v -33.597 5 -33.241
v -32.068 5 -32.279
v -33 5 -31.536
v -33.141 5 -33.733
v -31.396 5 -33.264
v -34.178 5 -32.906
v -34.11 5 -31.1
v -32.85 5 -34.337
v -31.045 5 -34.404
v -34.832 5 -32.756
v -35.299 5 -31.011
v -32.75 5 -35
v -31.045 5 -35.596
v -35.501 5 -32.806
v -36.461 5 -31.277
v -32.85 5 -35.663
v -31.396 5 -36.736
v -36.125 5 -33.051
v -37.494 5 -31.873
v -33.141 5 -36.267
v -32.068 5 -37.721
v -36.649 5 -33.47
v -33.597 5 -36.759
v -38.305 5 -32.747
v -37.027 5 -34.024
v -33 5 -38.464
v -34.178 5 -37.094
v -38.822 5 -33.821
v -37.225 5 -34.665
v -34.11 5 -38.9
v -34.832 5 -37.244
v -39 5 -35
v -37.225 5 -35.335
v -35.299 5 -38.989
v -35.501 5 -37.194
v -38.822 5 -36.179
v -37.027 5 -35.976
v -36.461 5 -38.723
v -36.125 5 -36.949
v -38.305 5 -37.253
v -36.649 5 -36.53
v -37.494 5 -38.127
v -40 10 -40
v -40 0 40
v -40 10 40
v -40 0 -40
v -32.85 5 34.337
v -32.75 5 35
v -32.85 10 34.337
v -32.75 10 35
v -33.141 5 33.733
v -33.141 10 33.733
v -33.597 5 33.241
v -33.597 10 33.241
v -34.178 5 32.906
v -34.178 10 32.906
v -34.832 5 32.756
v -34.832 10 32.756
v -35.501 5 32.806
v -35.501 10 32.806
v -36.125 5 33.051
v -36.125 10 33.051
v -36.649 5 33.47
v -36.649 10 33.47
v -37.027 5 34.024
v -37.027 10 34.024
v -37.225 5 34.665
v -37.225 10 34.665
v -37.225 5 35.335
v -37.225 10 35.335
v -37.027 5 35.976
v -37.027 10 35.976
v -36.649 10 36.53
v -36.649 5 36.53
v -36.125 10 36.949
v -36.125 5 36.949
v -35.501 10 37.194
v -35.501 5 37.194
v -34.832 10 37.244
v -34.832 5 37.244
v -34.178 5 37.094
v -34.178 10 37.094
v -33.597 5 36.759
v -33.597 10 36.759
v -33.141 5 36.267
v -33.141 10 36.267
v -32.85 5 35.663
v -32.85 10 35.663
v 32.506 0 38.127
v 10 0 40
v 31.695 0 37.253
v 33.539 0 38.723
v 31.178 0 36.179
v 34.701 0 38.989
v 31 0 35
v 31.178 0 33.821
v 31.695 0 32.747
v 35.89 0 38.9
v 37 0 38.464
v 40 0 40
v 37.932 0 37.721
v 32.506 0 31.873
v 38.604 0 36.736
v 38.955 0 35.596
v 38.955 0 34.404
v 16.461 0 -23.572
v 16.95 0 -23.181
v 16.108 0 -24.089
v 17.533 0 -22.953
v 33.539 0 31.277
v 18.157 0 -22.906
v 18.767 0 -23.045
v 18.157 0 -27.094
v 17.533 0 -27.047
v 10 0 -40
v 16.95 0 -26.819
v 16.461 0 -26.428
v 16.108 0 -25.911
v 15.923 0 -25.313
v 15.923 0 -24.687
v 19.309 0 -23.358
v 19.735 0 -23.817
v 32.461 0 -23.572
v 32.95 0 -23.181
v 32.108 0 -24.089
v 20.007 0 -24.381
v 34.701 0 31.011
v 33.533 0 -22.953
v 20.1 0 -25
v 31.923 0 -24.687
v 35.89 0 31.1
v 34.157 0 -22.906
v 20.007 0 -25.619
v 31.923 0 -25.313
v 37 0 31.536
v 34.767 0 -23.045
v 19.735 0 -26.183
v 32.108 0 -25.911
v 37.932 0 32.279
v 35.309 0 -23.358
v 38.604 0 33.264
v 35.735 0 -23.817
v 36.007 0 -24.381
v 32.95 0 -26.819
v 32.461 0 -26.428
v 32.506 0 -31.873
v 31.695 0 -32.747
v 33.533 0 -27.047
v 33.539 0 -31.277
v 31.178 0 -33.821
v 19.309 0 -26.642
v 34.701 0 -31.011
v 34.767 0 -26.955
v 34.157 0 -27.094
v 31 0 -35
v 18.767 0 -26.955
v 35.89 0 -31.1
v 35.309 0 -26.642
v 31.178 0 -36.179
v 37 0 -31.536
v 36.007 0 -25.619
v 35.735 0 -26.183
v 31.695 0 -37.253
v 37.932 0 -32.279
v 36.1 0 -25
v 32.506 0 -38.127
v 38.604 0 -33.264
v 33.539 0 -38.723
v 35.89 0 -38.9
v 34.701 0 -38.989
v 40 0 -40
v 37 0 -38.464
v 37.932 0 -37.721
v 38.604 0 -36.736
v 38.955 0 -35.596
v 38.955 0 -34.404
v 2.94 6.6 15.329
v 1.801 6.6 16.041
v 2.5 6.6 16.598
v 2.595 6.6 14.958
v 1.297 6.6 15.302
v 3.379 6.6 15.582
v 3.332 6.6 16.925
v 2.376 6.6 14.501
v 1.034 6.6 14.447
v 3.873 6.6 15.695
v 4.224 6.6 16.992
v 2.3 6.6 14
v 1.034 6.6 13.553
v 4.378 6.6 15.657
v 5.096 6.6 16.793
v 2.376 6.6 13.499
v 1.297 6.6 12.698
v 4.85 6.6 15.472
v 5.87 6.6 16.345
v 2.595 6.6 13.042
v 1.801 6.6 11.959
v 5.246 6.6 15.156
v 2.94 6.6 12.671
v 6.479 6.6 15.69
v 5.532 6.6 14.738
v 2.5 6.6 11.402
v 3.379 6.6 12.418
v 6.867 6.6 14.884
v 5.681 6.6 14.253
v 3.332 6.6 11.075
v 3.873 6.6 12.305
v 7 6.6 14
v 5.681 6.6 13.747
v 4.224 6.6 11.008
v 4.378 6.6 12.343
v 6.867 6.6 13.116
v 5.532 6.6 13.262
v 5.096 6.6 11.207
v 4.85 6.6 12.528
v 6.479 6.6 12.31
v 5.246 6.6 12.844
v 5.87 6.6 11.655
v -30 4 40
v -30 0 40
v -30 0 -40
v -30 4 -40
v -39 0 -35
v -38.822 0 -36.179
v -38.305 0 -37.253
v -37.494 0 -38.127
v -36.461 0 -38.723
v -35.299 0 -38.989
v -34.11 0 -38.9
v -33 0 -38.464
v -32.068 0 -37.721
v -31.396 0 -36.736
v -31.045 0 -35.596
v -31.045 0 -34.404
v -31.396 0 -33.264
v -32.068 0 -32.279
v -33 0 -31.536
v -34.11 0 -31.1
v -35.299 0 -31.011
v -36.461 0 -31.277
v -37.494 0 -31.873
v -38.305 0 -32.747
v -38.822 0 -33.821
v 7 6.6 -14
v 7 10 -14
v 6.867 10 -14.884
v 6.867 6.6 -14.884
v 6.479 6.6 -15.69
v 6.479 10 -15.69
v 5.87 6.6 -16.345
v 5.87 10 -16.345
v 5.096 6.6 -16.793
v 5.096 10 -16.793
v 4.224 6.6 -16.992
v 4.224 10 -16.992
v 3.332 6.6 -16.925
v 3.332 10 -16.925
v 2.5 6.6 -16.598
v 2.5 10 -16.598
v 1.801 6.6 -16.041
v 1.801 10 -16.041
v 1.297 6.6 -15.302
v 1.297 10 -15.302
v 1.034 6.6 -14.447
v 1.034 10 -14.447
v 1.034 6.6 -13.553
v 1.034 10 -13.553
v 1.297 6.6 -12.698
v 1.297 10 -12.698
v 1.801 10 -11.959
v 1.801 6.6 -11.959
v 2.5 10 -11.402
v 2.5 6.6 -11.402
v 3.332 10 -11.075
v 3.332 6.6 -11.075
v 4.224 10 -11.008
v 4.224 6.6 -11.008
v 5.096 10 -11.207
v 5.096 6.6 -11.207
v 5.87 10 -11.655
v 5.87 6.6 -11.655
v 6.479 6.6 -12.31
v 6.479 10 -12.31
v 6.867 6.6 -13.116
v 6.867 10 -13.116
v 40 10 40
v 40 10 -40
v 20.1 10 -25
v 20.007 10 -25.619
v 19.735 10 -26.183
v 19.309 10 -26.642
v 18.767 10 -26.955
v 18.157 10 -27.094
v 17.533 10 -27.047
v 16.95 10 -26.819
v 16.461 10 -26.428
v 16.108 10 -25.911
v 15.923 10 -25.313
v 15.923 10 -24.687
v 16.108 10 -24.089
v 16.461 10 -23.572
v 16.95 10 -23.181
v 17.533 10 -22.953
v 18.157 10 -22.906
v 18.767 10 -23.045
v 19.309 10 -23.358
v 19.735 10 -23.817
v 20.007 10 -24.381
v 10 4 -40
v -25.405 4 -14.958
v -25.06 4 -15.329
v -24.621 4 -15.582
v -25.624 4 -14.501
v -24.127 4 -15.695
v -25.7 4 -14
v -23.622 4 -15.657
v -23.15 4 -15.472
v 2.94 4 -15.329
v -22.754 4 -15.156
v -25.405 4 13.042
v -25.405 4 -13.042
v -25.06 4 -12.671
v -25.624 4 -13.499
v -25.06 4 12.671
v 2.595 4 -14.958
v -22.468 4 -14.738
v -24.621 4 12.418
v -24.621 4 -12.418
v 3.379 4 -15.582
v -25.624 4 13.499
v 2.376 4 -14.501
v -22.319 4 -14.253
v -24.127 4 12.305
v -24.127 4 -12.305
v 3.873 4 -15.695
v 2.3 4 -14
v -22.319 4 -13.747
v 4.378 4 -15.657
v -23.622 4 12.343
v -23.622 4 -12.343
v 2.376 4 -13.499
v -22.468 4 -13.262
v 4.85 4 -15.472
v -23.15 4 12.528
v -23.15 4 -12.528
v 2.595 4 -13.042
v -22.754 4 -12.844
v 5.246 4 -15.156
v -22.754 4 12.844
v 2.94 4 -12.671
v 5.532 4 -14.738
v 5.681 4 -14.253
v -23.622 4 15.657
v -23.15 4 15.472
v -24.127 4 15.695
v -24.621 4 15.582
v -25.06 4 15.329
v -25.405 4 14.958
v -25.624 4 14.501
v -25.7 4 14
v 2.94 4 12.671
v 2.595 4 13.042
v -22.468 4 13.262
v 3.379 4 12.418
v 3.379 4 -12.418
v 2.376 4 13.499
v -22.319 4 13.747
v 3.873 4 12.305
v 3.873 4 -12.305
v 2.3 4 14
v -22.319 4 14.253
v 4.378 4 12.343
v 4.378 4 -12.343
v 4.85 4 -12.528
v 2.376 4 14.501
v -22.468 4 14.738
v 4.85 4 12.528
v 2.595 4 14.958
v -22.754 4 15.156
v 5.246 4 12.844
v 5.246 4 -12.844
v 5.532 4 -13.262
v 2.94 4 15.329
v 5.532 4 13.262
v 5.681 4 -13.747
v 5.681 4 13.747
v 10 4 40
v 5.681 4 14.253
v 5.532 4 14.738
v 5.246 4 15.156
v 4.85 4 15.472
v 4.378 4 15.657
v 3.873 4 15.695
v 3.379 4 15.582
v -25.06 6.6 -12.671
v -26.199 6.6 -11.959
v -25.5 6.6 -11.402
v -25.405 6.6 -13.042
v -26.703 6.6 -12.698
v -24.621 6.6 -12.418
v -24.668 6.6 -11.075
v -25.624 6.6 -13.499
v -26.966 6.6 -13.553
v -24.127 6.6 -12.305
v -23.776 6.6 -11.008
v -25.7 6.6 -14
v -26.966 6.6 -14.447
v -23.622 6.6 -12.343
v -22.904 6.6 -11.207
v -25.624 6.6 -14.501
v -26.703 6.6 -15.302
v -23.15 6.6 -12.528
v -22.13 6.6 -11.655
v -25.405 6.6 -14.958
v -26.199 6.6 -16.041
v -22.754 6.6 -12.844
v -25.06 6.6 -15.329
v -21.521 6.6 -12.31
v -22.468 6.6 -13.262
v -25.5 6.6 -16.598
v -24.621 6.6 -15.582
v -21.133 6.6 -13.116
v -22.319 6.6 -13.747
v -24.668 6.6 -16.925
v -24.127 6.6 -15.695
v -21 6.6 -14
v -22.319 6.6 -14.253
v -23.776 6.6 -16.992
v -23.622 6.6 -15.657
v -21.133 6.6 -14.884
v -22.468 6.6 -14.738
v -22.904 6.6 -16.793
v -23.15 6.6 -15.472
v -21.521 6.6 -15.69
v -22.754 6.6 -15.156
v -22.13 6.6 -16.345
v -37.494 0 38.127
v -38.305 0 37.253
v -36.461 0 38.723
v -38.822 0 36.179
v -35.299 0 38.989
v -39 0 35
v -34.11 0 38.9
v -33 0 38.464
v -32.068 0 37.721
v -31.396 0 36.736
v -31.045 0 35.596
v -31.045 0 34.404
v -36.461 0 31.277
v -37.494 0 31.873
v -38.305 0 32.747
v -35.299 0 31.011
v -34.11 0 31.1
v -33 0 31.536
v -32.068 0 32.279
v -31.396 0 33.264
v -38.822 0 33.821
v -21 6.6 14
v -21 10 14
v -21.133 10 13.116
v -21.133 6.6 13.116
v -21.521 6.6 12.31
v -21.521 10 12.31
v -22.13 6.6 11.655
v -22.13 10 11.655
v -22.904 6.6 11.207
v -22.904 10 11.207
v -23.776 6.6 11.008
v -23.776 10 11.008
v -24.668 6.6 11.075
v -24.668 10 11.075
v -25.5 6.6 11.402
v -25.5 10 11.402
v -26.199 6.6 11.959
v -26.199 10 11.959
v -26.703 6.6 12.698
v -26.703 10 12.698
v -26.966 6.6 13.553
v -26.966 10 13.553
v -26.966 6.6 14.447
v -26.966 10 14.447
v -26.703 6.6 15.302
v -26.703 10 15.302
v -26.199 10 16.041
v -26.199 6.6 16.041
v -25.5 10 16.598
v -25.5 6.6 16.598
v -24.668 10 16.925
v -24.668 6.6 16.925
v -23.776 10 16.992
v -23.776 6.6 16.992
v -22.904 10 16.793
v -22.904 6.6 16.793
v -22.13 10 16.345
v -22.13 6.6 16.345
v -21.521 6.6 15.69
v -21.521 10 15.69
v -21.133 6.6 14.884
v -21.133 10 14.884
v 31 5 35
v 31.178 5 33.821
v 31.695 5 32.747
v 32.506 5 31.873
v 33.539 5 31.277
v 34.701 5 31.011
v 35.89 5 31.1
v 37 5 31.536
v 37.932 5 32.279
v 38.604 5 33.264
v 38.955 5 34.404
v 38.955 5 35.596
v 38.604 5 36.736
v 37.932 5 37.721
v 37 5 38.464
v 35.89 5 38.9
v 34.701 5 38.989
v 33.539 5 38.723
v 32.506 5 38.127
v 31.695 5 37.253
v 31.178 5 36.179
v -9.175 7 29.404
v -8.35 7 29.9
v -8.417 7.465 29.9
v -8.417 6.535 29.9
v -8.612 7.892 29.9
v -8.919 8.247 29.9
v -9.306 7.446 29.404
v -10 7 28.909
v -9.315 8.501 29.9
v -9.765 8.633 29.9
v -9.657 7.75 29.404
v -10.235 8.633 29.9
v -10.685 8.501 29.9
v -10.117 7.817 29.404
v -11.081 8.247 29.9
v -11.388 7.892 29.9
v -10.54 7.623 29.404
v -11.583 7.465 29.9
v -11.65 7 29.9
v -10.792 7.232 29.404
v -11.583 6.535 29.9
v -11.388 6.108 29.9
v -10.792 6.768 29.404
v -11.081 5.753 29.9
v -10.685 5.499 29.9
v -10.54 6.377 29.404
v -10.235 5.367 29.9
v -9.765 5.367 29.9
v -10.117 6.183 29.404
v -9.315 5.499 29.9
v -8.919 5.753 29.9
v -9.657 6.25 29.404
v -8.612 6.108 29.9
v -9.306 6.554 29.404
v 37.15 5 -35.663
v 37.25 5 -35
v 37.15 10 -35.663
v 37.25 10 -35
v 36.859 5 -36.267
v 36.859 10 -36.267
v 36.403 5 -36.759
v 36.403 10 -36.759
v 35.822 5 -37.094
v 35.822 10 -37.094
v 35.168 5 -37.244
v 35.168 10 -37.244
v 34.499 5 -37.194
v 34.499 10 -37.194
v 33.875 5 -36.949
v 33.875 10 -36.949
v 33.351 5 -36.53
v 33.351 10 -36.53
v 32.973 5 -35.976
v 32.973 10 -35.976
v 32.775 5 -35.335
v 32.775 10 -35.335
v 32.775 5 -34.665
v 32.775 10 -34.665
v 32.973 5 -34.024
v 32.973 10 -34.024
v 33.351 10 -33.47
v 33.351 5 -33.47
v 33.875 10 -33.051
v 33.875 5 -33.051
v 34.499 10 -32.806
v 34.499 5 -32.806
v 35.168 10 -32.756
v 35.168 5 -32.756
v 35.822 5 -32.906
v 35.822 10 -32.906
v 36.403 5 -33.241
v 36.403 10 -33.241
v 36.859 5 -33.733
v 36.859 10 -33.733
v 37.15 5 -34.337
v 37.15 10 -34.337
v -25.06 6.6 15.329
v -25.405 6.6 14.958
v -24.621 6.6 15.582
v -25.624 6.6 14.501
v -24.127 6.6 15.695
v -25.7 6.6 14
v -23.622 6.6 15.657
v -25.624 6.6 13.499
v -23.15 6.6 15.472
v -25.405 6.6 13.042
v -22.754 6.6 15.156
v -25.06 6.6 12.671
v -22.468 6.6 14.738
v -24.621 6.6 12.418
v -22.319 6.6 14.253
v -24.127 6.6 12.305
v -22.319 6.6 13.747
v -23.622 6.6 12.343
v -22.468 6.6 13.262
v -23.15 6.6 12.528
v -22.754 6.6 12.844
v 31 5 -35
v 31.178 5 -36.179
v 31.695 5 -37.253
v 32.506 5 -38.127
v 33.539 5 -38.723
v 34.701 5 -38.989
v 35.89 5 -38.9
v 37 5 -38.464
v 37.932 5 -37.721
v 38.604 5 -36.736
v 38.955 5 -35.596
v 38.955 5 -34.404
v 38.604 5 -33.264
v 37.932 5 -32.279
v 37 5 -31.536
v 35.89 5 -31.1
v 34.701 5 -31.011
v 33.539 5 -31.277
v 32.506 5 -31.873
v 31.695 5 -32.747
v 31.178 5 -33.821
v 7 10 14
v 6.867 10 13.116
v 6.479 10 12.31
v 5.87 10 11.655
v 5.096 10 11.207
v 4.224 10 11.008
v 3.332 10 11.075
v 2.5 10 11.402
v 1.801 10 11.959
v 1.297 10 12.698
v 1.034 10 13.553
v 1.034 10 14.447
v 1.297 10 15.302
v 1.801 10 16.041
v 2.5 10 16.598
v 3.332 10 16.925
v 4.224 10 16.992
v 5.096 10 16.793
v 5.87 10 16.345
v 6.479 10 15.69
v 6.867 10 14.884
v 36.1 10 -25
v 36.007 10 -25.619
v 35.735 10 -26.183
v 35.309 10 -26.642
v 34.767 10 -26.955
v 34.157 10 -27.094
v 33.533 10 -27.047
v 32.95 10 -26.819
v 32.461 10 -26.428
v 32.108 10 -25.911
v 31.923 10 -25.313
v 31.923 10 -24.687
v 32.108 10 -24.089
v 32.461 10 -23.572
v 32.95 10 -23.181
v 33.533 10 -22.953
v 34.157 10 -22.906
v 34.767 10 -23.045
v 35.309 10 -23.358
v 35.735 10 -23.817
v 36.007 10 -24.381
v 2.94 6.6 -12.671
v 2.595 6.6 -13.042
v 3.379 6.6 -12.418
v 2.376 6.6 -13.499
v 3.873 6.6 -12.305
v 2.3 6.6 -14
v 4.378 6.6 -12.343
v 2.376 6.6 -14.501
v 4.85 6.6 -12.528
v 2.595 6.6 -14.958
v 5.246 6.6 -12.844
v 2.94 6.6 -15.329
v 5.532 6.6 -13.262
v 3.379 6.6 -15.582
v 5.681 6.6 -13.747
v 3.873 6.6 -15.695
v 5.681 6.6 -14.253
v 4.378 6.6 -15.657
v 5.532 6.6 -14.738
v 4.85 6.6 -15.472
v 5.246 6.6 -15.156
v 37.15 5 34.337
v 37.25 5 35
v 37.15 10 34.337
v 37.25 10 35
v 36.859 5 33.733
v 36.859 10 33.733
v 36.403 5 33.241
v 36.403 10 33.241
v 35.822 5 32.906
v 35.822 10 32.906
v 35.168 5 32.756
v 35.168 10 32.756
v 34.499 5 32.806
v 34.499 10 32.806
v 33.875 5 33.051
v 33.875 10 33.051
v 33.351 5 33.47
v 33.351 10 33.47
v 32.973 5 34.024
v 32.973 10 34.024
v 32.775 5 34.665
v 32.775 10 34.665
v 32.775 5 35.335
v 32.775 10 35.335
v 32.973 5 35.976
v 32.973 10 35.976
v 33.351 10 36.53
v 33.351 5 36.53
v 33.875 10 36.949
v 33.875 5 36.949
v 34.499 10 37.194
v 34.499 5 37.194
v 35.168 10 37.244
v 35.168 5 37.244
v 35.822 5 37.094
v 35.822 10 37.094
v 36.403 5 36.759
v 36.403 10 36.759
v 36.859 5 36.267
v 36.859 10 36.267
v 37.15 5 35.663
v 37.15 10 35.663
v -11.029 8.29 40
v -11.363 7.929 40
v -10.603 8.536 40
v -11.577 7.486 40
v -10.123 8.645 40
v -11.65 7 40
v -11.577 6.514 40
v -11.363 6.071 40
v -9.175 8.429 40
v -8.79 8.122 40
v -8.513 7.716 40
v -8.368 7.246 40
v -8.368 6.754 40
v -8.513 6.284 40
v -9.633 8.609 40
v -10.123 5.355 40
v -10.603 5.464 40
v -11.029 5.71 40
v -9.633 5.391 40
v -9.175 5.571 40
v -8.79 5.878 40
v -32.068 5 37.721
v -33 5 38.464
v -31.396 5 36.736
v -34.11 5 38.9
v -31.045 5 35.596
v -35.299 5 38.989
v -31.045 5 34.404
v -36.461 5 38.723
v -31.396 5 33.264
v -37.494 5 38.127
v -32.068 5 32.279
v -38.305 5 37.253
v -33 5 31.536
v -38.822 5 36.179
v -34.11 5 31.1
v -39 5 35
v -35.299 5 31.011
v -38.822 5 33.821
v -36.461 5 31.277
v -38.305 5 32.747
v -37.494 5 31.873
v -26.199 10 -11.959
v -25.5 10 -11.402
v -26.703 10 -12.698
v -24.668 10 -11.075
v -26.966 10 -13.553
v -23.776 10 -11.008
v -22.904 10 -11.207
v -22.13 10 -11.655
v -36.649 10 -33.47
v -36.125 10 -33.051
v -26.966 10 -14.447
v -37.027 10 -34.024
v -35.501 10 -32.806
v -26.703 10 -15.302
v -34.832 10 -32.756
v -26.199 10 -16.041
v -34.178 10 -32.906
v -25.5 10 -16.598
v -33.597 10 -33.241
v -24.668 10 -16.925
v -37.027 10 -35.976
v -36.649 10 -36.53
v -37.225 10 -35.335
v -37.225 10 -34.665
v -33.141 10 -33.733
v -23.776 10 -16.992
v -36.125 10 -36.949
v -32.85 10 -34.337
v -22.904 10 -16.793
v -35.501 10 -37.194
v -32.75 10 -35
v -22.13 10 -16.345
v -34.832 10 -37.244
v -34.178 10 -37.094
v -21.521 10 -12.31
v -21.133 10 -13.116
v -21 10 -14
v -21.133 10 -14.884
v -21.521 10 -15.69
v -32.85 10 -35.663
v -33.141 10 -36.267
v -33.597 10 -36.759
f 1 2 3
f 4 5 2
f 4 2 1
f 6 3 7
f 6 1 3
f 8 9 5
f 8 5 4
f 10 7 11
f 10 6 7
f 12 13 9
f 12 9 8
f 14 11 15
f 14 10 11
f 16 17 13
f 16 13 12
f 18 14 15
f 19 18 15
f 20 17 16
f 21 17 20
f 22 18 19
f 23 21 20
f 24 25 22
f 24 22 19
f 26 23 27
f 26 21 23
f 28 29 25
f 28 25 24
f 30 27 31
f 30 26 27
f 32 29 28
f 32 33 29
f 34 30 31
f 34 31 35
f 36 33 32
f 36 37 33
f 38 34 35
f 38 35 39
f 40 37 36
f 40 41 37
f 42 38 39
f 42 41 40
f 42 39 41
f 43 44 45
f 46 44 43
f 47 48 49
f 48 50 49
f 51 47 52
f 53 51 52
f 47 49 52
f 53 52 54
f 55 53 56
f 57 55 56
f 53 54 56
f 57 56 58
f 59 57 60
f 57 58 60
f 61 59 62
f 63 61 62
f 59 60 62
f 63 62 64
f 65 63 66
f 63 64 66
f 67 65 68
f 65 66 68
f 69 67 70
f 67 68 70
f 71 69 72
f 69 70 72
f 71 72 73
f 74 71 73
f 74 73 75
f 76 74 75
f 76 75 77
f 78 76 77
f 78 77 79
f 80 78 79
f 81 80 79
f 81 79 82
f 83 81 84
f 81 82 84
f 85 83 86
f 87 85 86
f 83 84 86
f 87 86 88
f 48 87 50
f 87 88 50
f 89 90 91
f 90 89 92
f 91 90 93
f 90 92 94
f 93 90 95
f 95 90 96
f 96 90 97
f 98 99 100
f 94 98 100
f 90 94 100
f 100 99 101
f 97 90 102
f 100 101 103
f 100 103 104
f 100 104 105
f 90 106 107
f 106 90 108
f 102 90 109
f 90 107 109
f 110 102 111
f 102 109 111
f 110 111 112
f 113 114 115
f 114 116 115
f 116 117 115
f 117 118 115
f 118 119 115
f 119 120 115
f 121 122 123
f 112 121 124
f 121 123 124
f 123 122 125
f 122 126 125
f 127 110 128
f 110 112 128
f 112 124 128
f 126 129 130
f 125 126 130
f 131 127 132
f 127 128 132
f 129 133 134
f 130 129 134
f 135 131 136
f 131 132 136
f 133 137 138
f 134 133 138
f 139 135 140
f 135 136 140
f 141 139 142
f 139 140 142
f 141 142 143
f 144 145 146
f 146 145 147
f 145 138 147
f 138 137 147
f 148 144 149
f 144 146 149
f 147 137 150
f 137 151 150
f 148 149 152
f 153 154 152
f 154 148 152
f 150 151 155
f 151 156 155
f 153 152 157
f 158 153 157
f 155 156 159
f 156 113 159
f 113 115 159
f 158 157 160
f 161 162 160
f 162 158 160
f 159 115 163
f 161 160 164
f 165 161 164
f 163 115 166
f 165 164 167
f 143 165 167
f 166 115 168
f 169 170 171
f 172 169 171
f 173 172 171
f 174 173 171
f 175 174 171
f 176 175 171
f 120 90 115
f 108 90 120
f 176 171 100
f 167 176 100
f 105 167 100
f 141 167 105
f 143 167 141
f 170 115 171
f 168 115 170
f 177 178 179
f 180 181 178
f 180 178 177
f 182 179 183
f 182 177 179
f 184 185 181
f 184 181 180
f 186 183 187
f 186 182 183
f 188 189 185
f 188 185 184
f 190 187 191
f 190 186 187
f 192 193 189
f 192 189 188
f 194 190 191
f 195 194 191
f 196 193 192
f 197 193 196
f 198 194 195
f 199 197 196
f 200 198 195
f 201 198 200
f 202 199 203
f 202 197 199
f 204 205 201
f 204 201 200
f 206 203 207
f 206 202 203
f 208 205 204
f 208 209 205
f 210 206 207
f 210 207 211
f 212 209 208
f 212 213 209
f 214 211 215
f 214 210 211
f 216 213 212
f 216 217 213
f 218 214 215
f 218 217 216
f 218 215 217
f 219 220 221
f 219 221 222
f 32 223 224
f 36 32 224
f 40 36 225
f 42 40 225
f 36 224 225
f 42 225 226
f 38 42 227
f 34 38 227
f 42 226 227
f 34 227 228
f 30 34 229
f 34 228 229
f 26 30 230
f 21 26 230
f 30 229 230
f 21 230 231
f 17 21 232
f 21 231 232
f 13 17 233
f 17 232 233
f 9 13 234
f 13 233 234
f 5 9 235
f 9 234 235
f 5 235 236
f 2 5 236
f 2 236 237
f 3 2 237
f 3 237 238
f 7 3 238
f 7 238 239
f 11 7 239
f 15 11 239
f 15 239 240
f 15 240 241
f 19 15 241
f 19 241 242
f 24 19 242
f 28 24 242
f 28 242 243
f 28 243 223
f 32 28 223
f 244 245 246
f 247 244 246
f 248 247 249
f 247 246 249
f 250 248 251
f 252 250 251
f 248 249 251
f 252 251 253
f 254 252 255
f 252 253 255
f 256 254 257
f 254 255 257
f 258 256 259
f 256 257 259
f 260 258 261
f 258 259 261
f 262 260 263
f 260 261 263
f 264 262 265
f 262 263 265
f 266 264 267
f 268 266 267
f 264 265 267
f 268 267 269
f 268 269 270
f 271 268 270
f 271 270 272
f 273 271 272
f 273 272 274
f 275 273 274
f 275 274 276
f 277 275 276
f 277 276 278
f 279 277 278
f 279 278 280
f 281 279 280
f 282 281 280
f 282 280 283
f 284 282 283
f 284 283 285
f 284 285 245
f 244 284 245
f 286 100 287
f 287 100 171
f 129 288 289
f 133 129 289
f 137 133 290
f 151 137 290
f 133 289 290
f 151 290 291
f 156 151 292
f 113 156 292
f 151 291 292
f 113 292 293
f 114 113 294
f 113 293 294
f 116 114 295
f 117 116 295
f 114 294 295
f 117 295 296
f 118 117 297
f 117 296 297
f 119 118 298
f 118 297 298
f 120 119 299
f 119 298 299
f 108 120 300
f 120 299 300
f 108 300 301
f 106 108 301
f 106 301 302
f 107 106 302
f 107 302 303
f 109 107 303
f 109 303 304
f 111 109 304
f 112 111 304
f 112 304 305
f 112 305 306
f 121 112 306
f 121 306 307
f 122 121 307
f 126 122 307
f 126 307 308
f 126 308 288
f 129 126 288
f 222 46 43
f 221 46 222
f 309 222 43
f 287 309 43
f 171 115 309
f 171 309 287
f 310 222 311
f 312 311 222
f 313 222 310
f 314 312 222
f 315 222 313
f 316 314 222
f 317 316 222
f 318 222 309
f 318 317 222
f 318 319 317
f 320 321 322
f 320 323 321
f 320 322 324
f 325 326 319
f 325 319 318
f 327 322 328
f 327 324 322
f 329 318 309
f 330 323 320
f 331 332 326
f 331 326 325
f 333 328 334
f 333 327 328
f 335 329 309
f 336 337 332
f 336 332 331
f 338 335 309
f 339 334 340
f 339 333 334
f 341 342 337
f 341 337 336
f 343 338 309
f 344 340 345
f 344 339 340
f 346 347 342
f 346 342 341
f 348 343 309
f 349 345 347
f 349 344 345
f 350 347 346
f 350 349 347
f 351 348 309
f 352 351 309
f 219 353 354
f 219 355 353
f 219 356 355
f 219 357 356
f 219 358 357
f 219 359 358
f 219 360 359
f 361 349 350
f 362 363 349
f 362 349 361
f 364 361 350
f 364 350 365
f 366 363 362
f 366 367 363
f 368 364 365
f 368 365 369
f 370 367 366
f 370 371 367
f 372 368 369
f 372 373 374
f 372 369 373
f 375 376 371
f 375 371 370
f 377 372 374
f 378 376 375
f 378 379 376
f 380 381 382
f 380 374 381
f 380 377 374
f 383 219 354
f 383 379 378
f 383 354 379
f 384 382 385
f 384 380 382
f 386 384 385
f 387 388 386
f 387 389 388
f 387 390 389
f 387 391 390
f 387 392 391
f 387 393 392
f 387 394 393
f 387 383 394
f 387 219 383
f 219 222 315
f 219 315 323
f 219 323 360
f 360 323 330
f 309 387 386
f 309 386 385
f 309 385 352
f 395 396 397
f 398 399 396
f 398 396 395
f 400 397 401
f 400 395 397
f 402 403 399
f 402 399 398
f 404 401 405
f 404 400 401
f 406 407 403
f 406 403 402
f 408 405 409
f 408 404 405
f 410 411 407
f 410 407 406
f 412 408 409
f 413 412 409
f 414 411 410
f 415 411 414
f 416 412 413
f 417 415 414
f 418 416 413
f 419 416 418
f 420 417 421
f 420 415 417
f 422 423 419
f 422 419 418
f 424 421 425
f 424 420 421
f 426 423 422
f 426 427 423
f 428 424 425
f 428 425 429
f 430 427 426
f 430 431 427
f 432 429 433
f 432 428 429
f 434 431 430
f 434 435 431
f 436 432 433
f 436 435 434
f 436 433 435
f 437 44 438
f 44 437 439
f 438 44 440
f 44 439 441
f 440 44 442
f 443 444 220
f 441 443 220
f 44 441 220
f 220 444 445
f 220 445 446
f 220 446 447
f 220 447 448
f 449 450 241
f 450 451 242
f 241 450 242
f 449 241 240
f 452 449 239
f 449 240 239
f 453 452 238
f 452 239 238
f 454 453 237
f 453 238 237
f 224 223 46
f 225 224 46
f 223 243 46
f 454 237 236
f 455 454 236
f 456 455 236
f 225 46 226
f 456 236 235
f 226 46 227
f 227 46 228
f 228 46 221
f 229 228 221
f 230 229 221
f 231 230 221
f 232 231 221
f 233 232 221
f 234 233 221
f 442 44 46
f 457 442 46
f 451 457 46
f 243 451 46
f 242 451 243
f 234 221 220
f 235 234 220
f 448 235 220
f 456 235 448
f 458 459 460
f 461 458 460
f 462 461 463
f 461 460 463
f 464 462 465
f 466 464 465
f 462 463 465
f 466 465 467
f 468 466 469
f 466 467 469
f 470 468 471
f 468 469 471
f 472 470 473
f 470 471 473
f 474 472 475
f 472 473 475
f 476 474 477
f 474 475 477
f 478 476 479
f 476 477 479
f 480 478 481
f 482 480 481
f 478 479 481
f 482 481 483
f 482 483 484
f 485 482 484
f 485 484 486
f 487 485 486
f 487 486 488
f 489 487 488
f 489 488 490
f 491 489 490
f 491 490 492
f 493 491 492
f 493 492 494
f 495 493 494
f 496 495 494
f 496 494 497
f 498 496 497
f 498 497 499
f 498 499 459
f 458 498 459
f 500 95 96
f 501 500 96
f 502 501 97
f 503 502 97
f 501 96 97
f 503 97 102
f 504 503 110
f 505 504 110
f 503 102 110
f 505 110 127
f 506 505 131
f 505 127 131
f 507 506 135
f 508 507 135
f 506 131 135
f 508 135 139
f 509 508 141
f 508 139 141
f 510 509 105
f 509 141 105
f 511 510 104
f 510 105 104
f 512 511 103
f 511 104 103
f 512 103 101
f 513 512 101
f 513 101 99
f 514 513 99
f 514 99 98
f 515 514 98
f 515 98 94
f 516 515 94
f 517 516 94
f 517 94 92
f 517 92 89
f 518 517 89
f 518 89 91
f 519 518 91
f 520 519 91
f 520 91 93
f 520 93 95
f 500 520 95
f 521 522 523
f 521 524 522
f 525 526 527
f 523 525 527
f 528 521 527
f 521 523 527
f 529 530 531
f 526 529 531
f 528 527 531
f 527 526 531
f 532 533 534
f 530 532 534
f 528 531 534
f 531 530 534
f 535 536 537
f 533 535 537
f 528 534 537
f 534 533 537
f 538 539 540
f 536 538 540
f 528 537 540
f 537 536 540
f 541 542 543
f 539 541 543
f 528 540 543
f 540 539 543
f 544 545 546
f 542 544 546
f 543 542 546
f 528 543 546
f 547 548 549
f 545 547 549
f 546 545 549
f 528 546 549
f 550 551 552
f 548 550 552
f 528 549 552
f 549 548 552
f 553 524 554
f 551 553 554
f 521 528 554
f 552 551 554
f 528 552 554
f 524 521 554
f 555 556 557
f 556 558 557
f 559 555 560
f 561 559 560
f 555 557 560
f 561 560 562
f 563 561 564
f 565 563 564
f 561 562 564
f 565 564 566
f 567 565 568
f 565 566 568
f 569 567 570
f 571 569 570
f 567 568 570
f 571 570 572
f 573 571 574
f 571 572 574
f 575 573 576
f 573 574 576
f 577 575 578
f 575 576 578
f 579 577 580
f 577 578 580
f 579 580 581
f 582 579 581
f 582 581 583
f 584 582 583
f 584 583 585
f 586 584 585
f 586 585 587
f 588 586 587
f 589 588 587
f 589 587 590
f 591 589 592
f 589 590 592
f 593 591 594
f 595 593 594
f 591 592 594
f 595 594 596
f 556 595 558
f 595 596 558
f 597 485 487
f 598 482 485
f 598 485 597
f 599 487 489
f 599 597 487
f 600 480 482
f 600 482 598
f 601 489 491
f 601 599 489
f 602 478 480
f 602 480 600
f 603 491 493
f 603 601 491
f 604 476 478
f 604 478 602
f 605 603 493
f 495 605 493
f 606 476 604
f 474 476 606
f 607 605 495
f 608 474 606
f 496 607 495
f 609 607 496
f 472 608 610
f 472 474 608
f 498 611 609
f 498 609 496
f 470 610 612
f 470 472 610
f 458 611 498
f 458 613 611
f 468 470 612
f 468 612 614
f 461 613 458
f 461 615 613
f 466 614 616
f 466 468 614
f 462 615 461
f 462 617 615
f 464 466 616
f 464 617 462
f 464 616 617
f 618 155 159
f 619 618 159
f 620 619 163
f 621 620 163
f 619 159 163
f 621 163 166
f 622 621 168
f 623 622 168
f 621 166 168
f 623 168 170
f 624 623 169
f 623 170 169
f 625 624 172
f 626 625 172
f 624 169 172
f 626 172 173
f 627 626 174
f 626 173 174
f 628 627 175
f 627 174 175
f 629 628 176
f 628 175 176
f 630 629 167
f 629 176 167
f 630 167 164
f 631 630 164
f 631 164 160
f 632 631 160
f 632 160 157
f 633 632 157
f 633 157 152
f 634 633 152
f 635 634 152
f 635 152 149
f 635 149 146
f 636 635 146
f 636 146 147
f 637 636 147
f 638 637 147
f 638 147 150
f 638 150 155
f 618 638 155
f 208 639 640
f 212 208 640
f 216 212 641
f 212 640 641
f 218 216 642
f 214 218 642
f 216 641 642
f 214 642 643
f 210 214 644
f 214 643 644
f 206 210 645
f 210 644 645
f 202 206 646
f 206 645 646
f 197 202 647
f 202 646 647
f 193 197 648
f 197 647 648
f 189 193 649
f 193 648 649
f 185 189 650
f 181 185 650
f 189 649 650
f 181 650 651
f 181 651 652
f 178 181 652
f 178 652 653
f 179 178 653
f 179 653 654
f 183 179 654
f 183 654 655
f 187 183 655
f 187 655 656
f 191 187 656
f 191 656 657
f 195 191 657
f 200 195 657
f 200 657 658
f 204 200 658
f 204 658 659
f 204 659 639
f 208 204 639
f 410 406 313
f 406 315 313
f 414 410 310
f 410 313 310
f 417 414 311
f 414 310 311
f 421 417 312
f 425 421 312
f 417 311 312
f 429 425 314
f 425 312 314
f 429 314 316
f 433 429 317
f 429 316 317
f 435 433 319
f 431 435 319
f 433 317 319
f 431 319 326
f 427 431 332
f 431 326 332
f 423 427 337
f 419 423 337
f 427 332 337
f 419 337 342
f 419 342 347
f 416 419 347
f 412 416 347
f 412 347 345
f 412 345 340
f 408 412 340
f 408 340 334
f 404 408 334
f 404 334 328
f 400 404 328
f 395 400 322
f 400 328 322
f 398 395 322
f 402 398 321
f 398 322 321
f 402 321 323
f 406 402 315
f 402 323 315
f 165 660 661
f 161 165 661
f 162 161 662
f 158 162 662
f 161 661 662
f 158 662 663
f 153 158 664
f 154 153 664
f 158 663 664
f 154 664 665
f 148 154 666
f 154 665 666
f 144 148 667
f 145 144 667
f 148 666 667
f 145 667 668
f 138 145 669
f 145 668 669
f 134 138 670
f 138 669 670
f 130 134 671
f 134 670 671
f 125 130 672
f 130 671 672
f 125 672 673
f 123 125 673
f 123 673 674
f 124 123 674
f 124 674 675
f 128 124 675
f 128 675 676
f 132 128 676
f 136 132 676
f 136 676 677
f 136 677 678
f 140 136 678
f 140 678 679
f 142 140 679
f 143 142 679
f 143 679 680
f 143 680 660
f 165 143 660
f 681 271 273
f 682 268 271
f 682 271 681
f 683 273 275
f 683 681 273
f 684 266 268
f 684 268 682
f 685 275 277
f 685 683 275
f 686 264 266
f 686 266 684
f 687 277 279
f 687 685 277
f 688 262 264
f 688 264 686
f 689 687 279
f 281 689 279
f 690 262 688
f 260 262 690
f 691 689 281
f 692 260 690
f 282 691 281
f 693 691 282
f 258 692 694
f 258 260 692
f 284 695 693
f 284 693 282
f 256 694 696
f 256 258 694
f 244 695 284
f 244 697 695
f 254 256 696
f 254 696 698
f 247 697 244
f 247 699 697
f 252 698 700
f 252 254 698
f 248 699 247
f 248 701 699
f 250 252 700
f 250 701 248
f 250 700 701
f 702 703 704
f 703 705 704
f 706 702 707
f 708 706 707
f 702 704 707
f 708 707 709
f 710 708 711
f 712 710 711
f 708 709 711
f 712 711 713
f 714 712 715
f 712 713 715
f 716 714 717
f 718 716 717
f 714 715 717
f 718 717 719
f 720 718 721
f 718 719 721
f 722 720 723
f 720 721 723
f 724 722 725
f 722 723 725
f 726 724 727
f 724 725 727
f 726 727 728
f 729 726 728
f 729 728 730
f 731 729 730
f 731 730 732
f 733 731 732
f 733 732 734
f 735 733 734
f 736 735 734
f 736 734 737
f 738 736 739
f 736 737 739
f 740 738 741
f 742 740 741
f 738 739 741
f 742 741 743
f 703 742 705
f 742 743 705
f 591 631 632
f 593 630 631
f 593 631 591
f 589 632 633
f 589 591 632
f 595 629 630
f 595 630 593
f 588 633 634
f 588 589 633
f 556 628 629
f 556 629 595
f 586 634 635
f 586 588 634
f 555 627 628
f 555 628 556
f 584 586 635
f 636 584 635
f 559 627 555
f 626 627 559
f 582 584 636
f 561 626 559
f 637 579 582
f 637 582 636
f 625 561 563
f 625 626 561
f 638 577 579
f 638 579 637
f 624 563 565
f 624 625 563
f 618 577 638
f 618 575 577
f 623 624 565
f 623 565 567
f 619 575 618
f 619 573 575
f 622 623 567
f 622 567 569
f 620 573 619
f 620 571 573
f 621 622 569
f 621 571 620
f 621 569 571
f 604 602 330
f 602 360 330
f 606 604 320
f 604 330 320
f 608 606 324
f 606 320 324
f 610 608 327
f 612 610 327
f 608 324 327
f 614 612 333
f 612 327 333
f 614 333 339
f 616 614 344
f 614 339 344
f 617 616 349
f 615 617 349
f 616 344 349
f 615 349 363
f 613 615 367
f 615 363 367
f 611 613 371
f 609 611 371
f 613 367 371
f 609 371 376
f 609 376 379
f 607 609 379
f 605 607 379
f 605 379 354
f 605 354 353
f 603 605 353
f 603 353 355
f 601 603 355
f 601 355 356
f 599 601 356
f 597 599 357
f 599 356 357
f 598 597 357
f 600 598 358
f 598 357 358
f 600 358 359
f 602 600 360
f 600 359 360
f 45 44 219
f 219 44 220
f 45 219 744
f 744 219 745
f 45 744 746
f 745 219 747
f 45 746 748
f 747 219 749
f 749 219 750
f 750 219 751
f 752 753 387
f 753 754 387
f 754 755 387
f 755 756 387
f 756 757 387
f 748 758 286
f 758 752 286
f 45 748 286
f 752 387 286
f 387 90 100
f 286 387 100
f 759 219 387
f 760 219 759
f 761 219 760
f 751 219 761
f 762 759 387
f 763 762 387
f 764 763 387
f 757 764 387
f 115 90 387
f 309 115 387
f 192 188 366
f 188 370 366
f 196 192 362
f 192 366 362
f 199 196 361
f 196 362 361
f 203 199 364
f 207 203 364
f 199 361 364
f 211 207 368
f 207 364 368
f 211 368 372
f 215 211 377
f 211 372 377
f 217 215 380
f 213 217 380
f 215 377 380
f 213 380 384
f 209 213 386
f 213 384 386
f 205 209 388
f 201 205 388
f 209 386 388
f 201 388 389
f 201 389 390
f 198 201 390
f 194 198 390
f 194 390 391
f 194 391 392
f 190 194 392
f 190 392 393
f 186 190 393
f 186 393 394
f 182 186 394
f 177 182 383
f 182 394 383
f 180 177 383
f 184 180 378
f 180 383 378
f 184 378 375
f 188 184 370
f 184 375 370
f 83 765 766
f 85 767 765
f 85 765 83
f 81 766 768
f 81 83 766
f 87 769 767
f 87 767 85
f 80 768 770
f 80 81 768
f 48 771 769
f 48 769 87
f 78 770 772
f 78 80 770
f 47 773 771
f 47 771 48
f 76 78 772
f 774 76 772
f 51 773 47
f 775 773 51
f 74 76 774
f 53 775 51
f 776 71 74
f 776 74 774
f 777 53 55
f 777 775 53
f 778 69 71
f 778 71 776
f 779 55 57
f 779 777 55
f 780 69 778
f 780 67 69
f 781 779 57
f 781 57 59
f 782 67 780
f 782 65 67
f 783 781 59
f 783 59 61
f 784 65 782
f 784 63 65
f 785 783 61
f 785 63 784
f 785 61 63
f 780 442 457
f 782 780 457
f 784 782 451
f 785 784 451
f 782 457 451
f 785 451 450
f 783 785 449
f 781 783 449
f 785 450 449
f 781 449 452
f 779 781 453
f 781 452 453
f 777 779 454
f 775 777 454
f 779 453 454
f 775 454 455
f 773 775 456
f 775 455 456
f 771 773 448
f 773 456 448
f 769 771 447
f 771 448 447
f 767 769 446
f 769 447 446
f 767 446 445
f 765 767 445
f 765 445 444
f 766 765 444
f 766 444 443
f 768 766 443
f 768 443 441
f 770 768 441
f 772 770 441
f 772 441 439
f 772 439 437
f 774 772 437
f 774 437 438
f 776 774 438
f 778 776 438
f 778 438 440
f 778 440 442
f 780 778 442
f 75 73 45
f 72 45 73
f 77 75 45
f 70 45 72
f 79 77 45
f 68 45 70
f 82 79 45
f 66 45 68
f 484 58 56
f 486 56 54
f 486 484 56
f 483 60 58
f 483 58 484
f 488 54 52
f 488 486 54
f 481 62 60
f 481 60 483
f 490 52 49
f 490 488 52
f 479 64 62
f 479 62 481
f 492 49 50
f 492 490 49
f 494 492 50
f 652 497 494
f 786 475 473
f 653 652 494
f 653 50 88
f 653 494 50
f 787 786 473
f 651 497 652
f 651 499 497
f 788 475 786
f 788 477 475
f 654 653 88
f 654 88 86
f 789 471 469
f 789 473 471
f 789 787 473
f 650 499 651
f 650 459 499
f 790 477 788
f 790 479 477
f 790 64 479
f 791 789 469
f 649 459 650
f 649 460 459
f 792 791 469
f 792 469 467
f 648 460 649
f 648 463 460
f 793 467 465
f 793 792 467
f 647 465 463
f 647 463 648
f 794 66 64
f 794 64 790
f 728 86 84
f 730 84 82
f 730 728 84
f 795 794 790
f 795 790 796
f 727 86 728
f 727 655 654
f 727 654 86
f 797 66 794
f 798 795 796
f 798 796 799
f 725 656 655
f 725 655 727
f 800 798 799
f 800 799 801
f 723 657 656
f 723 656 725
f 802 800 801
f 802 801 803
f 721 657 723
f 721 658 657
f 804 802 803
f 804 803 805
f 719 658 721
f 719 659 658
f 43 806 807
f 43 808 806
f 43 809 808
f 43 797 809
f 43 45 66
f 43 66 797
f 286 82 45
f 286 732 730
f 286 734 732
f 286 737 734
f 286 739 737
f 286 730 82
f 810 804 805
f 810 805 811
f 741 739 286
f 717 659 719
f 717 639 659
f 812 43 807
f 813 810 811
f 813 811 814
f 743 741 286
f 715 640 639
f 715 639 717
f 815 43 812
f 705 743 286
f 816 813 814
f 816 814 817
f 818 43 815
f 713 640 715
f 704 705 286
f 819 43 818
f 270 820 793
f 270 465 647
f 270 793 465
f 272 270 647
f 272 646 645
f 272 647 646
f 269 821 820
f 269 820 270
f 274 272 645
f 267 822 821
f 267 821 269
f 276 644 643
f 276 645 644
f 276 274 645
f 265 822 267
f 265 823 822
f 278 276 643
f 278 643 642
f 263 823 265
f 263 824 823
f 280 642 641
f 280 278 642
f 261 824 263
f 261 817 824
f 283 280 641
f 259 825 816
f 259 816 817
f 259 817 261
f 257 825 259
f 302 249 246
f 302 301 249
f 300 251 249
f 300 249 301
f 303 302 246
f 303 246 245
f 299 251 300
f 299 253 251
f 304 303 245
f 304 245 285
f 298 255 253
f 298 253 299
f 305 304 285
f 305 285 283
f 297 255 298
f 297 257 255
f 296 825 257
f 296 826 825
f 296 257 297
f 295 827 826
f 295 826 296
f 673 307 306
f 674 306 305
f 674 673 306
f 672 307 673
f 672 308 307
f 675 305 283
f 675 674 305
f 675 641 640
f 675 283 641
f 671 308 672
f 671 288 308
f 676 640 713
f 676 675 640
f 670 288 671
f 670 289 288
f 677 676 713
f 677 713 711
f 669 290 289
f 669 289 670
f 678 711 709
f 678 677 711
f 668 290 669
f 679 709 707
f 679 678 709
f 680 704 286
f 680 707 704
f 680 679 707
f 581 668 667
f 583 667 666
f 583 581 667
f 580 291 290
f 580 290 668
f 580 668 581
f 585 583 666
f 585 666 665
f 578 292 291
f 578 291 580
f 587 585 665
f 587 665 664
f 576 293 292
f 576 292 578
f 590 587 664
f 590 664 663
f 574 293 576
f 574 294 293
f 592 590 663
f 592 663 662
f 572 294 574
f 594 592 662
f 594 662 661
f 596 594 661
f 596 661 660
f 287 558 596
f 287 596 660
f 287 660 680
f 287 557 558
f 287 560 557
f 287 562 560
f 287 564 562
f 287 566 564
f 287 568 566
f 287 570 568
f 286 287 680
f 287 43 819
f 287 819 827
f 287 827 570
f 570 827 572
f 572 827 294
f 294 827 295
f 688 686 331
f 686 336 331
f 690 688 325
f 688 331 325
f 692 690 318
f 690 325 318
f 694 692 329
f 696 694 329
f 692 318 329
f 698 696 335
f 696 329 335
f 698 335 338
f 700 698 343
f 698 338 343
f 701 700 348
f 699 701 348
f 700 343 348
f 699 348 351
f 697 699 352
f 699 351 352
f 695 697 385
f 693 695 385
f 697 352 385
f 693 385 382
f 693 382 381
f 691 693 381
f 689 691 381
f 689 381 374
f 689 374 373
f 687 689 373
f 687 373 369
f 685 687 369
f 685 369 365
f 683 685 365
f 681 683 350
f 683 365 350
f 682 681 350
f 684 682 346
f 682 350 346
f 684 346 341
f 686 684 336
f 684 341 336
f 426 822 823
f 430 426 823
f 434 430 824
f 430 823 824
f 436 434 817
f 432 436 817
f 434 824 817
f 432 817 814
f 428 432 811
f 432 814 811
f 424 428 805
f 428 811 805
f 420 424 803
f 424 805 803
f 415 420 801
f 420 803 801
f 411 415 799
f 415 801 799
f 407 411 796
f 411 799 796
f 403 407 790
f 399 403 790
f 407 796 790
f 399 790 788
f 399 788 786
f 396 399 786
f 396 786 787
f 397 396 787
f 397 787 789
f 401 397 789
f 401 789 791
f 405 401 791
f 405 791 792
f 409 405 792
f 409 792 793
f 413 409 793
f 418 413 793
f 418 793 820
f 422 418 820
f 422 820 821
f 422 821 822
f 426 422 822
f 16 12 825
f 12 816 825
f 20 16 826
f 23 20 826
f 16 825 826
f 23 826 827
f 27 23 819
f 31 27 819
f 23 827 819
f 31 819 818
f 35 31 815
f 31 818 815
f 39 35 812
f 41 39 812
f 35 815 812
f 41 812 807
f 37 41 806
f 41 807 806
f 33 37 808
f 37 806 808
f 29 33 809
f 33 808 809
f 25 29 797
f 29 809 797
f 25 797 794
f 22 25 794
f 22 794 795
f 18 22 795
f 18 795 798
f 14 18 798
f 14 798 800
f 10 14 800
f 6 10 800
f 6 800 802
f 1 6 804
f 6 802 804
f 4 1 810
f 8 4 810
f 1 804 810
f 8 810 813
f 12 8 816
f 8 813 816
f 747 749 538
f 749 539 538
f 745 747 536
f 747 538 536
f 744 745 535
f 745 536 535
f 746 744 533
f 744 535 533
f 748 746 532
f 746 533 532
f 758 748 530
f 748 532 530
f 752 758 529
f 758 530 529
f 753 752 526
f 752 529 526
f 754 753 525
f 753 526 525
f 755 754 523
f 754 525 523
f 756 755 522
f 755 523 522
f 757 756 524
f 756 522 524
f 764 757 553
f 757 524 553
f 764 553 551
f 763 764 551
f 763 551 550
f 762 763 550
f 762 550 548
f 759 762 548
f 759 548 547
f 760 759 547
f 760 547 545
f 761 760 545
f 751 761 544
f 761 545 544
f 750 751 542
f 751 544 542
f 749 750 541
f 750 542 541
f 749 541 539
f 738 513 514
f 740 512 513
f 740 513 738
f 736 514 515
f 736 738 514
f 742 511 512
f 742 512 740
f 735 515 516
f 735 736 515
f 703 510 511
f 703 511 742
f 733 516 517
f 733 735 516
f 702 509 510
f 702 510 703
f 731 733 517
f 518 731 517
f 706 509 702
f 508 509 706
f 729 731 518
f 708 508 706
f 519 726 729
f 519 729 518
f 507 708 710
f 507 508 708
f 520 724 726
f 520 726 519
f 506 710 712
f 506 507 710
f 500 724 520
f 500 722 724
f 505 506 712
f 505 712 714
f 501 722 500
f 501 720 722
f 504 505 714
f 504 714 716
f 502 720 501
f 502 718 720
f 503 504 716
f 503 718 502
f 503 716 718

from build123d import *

# Parameters (mm, degrees)
SKETCH_1_W                = 80
SKETCH_1_H                = 80
EXTRUDE_1_DEPTH           = 10
SKETCH_2_W                = 40
SKETCH_2_H                = 4
CUT_EXTRUDE_1_DEPTH       = 91
HOLE_WIZARD_1_D           = 3.4
HOLE_WIZARD_1_CBORE_D     = 6
HOLE_WIZARD_1_CBORE_DEPTH = 3.4
HOLE_WIZARD_M5_1_D        = 4.2
HOLE_WIZARD_2_D           = 4.5
HOLE_WIZARD_2_CBORE_D     = 8
HOLE_WIZARD_2_CBORE_DEPTH = 5
HOLE_WIZARD_M4_1_D        = 3.3
HOLE_WIZARD_M4_1_DEPTH    = 10.1
HOLE_WIZARD_M4_1_TIP      = 0.991420021


with BuildPart() as part:
    # 草图1 → 凸台-拉伸1 (new body)
    with BuildSketch(Plane(origin=(0, 0, 0), x_dir=(1, 0, 0), z_dir=(0, 1, 0))):
        Rectangle(SKETCH_1_W, SKETCH_1_H)
    extrude(amount=EXTRUDE_1_DEPTH)

    # 草图2 → 切除-拉伸1 (cut, through all)
    with BuildSketch(Plane.XY.offset(40)):
        with Locations((-10, 2)):
            Rectangle(SKETCH_2_W, SKETCH_2_H)
    extrude(amount=-CUT_EXTRUDE_1_DEPTH, mode=Mode.SUBTRACT)

    # 打孔尺寸根据内六角圆柱头螺钉的类型1 (through all)
    with Locations(Plane(origin=(0, 10, 0), x_dir=(1, 0, 0), z_dir=(0, 1, 0))):
        with Locations((-24, 14), (4, 14), (4, -14), (-24, -14)):
            CounterBoreHole(HOLE_WIZARD_1_D / 2, HOLE_WIZARD_1_CBORE_D / 2, HOLE_WIZARD_1_CBORE_DEPTH)

    # M5 螺纹孔1 (through all)
    with Locations(Plane(origin=(0, 0, 0), x_dir=(-1, 0, 0), z_dir=(0, -1, 0))):
        with Locations((-18, 25), (-34, 25)):
            Hole(HOLE_WIZARD_M5_1_D / 2)

    # 打孔尺寸根据内六角圆柱头螺钉的类型2 (through all)
    with Locations(Plane(origin=(0, 0, 0), x_dir=(-1, 0, 0), z_dir=(0, -1, 0))):
        with Locations((35, -35), (-35, -35), (-35, 35), (35, 35)):
            CounterBoreHole(HOLE_WIZARD_2_D / 2, HOLE_WIZARD_2_CBORE_D / 2, HOLE_WIZARD_2_CBORE_DEPTH)

    # M4 螺纹孔1
    with Locations(Plane.XY.offset(40)):
        with Locations((-10, 7)):
            Hole(HOLE_WIZARD_M4_1_D / 2, depth=HOLE_WIZARD_M4_1_DEPTH)
            with Locations((0, 0, -(HOLE_WIZARD_M4_1_DEPTH + HOLE_WIZARD_M4_1_TIP / 2))):  # 118° drill point
                Cone(0, HOLE_WIZARD_M4_1_D / 2, HOLE_WIZARD_M4_1_TIP, mode=Mode.SUBTRACT)


solid = part.part
